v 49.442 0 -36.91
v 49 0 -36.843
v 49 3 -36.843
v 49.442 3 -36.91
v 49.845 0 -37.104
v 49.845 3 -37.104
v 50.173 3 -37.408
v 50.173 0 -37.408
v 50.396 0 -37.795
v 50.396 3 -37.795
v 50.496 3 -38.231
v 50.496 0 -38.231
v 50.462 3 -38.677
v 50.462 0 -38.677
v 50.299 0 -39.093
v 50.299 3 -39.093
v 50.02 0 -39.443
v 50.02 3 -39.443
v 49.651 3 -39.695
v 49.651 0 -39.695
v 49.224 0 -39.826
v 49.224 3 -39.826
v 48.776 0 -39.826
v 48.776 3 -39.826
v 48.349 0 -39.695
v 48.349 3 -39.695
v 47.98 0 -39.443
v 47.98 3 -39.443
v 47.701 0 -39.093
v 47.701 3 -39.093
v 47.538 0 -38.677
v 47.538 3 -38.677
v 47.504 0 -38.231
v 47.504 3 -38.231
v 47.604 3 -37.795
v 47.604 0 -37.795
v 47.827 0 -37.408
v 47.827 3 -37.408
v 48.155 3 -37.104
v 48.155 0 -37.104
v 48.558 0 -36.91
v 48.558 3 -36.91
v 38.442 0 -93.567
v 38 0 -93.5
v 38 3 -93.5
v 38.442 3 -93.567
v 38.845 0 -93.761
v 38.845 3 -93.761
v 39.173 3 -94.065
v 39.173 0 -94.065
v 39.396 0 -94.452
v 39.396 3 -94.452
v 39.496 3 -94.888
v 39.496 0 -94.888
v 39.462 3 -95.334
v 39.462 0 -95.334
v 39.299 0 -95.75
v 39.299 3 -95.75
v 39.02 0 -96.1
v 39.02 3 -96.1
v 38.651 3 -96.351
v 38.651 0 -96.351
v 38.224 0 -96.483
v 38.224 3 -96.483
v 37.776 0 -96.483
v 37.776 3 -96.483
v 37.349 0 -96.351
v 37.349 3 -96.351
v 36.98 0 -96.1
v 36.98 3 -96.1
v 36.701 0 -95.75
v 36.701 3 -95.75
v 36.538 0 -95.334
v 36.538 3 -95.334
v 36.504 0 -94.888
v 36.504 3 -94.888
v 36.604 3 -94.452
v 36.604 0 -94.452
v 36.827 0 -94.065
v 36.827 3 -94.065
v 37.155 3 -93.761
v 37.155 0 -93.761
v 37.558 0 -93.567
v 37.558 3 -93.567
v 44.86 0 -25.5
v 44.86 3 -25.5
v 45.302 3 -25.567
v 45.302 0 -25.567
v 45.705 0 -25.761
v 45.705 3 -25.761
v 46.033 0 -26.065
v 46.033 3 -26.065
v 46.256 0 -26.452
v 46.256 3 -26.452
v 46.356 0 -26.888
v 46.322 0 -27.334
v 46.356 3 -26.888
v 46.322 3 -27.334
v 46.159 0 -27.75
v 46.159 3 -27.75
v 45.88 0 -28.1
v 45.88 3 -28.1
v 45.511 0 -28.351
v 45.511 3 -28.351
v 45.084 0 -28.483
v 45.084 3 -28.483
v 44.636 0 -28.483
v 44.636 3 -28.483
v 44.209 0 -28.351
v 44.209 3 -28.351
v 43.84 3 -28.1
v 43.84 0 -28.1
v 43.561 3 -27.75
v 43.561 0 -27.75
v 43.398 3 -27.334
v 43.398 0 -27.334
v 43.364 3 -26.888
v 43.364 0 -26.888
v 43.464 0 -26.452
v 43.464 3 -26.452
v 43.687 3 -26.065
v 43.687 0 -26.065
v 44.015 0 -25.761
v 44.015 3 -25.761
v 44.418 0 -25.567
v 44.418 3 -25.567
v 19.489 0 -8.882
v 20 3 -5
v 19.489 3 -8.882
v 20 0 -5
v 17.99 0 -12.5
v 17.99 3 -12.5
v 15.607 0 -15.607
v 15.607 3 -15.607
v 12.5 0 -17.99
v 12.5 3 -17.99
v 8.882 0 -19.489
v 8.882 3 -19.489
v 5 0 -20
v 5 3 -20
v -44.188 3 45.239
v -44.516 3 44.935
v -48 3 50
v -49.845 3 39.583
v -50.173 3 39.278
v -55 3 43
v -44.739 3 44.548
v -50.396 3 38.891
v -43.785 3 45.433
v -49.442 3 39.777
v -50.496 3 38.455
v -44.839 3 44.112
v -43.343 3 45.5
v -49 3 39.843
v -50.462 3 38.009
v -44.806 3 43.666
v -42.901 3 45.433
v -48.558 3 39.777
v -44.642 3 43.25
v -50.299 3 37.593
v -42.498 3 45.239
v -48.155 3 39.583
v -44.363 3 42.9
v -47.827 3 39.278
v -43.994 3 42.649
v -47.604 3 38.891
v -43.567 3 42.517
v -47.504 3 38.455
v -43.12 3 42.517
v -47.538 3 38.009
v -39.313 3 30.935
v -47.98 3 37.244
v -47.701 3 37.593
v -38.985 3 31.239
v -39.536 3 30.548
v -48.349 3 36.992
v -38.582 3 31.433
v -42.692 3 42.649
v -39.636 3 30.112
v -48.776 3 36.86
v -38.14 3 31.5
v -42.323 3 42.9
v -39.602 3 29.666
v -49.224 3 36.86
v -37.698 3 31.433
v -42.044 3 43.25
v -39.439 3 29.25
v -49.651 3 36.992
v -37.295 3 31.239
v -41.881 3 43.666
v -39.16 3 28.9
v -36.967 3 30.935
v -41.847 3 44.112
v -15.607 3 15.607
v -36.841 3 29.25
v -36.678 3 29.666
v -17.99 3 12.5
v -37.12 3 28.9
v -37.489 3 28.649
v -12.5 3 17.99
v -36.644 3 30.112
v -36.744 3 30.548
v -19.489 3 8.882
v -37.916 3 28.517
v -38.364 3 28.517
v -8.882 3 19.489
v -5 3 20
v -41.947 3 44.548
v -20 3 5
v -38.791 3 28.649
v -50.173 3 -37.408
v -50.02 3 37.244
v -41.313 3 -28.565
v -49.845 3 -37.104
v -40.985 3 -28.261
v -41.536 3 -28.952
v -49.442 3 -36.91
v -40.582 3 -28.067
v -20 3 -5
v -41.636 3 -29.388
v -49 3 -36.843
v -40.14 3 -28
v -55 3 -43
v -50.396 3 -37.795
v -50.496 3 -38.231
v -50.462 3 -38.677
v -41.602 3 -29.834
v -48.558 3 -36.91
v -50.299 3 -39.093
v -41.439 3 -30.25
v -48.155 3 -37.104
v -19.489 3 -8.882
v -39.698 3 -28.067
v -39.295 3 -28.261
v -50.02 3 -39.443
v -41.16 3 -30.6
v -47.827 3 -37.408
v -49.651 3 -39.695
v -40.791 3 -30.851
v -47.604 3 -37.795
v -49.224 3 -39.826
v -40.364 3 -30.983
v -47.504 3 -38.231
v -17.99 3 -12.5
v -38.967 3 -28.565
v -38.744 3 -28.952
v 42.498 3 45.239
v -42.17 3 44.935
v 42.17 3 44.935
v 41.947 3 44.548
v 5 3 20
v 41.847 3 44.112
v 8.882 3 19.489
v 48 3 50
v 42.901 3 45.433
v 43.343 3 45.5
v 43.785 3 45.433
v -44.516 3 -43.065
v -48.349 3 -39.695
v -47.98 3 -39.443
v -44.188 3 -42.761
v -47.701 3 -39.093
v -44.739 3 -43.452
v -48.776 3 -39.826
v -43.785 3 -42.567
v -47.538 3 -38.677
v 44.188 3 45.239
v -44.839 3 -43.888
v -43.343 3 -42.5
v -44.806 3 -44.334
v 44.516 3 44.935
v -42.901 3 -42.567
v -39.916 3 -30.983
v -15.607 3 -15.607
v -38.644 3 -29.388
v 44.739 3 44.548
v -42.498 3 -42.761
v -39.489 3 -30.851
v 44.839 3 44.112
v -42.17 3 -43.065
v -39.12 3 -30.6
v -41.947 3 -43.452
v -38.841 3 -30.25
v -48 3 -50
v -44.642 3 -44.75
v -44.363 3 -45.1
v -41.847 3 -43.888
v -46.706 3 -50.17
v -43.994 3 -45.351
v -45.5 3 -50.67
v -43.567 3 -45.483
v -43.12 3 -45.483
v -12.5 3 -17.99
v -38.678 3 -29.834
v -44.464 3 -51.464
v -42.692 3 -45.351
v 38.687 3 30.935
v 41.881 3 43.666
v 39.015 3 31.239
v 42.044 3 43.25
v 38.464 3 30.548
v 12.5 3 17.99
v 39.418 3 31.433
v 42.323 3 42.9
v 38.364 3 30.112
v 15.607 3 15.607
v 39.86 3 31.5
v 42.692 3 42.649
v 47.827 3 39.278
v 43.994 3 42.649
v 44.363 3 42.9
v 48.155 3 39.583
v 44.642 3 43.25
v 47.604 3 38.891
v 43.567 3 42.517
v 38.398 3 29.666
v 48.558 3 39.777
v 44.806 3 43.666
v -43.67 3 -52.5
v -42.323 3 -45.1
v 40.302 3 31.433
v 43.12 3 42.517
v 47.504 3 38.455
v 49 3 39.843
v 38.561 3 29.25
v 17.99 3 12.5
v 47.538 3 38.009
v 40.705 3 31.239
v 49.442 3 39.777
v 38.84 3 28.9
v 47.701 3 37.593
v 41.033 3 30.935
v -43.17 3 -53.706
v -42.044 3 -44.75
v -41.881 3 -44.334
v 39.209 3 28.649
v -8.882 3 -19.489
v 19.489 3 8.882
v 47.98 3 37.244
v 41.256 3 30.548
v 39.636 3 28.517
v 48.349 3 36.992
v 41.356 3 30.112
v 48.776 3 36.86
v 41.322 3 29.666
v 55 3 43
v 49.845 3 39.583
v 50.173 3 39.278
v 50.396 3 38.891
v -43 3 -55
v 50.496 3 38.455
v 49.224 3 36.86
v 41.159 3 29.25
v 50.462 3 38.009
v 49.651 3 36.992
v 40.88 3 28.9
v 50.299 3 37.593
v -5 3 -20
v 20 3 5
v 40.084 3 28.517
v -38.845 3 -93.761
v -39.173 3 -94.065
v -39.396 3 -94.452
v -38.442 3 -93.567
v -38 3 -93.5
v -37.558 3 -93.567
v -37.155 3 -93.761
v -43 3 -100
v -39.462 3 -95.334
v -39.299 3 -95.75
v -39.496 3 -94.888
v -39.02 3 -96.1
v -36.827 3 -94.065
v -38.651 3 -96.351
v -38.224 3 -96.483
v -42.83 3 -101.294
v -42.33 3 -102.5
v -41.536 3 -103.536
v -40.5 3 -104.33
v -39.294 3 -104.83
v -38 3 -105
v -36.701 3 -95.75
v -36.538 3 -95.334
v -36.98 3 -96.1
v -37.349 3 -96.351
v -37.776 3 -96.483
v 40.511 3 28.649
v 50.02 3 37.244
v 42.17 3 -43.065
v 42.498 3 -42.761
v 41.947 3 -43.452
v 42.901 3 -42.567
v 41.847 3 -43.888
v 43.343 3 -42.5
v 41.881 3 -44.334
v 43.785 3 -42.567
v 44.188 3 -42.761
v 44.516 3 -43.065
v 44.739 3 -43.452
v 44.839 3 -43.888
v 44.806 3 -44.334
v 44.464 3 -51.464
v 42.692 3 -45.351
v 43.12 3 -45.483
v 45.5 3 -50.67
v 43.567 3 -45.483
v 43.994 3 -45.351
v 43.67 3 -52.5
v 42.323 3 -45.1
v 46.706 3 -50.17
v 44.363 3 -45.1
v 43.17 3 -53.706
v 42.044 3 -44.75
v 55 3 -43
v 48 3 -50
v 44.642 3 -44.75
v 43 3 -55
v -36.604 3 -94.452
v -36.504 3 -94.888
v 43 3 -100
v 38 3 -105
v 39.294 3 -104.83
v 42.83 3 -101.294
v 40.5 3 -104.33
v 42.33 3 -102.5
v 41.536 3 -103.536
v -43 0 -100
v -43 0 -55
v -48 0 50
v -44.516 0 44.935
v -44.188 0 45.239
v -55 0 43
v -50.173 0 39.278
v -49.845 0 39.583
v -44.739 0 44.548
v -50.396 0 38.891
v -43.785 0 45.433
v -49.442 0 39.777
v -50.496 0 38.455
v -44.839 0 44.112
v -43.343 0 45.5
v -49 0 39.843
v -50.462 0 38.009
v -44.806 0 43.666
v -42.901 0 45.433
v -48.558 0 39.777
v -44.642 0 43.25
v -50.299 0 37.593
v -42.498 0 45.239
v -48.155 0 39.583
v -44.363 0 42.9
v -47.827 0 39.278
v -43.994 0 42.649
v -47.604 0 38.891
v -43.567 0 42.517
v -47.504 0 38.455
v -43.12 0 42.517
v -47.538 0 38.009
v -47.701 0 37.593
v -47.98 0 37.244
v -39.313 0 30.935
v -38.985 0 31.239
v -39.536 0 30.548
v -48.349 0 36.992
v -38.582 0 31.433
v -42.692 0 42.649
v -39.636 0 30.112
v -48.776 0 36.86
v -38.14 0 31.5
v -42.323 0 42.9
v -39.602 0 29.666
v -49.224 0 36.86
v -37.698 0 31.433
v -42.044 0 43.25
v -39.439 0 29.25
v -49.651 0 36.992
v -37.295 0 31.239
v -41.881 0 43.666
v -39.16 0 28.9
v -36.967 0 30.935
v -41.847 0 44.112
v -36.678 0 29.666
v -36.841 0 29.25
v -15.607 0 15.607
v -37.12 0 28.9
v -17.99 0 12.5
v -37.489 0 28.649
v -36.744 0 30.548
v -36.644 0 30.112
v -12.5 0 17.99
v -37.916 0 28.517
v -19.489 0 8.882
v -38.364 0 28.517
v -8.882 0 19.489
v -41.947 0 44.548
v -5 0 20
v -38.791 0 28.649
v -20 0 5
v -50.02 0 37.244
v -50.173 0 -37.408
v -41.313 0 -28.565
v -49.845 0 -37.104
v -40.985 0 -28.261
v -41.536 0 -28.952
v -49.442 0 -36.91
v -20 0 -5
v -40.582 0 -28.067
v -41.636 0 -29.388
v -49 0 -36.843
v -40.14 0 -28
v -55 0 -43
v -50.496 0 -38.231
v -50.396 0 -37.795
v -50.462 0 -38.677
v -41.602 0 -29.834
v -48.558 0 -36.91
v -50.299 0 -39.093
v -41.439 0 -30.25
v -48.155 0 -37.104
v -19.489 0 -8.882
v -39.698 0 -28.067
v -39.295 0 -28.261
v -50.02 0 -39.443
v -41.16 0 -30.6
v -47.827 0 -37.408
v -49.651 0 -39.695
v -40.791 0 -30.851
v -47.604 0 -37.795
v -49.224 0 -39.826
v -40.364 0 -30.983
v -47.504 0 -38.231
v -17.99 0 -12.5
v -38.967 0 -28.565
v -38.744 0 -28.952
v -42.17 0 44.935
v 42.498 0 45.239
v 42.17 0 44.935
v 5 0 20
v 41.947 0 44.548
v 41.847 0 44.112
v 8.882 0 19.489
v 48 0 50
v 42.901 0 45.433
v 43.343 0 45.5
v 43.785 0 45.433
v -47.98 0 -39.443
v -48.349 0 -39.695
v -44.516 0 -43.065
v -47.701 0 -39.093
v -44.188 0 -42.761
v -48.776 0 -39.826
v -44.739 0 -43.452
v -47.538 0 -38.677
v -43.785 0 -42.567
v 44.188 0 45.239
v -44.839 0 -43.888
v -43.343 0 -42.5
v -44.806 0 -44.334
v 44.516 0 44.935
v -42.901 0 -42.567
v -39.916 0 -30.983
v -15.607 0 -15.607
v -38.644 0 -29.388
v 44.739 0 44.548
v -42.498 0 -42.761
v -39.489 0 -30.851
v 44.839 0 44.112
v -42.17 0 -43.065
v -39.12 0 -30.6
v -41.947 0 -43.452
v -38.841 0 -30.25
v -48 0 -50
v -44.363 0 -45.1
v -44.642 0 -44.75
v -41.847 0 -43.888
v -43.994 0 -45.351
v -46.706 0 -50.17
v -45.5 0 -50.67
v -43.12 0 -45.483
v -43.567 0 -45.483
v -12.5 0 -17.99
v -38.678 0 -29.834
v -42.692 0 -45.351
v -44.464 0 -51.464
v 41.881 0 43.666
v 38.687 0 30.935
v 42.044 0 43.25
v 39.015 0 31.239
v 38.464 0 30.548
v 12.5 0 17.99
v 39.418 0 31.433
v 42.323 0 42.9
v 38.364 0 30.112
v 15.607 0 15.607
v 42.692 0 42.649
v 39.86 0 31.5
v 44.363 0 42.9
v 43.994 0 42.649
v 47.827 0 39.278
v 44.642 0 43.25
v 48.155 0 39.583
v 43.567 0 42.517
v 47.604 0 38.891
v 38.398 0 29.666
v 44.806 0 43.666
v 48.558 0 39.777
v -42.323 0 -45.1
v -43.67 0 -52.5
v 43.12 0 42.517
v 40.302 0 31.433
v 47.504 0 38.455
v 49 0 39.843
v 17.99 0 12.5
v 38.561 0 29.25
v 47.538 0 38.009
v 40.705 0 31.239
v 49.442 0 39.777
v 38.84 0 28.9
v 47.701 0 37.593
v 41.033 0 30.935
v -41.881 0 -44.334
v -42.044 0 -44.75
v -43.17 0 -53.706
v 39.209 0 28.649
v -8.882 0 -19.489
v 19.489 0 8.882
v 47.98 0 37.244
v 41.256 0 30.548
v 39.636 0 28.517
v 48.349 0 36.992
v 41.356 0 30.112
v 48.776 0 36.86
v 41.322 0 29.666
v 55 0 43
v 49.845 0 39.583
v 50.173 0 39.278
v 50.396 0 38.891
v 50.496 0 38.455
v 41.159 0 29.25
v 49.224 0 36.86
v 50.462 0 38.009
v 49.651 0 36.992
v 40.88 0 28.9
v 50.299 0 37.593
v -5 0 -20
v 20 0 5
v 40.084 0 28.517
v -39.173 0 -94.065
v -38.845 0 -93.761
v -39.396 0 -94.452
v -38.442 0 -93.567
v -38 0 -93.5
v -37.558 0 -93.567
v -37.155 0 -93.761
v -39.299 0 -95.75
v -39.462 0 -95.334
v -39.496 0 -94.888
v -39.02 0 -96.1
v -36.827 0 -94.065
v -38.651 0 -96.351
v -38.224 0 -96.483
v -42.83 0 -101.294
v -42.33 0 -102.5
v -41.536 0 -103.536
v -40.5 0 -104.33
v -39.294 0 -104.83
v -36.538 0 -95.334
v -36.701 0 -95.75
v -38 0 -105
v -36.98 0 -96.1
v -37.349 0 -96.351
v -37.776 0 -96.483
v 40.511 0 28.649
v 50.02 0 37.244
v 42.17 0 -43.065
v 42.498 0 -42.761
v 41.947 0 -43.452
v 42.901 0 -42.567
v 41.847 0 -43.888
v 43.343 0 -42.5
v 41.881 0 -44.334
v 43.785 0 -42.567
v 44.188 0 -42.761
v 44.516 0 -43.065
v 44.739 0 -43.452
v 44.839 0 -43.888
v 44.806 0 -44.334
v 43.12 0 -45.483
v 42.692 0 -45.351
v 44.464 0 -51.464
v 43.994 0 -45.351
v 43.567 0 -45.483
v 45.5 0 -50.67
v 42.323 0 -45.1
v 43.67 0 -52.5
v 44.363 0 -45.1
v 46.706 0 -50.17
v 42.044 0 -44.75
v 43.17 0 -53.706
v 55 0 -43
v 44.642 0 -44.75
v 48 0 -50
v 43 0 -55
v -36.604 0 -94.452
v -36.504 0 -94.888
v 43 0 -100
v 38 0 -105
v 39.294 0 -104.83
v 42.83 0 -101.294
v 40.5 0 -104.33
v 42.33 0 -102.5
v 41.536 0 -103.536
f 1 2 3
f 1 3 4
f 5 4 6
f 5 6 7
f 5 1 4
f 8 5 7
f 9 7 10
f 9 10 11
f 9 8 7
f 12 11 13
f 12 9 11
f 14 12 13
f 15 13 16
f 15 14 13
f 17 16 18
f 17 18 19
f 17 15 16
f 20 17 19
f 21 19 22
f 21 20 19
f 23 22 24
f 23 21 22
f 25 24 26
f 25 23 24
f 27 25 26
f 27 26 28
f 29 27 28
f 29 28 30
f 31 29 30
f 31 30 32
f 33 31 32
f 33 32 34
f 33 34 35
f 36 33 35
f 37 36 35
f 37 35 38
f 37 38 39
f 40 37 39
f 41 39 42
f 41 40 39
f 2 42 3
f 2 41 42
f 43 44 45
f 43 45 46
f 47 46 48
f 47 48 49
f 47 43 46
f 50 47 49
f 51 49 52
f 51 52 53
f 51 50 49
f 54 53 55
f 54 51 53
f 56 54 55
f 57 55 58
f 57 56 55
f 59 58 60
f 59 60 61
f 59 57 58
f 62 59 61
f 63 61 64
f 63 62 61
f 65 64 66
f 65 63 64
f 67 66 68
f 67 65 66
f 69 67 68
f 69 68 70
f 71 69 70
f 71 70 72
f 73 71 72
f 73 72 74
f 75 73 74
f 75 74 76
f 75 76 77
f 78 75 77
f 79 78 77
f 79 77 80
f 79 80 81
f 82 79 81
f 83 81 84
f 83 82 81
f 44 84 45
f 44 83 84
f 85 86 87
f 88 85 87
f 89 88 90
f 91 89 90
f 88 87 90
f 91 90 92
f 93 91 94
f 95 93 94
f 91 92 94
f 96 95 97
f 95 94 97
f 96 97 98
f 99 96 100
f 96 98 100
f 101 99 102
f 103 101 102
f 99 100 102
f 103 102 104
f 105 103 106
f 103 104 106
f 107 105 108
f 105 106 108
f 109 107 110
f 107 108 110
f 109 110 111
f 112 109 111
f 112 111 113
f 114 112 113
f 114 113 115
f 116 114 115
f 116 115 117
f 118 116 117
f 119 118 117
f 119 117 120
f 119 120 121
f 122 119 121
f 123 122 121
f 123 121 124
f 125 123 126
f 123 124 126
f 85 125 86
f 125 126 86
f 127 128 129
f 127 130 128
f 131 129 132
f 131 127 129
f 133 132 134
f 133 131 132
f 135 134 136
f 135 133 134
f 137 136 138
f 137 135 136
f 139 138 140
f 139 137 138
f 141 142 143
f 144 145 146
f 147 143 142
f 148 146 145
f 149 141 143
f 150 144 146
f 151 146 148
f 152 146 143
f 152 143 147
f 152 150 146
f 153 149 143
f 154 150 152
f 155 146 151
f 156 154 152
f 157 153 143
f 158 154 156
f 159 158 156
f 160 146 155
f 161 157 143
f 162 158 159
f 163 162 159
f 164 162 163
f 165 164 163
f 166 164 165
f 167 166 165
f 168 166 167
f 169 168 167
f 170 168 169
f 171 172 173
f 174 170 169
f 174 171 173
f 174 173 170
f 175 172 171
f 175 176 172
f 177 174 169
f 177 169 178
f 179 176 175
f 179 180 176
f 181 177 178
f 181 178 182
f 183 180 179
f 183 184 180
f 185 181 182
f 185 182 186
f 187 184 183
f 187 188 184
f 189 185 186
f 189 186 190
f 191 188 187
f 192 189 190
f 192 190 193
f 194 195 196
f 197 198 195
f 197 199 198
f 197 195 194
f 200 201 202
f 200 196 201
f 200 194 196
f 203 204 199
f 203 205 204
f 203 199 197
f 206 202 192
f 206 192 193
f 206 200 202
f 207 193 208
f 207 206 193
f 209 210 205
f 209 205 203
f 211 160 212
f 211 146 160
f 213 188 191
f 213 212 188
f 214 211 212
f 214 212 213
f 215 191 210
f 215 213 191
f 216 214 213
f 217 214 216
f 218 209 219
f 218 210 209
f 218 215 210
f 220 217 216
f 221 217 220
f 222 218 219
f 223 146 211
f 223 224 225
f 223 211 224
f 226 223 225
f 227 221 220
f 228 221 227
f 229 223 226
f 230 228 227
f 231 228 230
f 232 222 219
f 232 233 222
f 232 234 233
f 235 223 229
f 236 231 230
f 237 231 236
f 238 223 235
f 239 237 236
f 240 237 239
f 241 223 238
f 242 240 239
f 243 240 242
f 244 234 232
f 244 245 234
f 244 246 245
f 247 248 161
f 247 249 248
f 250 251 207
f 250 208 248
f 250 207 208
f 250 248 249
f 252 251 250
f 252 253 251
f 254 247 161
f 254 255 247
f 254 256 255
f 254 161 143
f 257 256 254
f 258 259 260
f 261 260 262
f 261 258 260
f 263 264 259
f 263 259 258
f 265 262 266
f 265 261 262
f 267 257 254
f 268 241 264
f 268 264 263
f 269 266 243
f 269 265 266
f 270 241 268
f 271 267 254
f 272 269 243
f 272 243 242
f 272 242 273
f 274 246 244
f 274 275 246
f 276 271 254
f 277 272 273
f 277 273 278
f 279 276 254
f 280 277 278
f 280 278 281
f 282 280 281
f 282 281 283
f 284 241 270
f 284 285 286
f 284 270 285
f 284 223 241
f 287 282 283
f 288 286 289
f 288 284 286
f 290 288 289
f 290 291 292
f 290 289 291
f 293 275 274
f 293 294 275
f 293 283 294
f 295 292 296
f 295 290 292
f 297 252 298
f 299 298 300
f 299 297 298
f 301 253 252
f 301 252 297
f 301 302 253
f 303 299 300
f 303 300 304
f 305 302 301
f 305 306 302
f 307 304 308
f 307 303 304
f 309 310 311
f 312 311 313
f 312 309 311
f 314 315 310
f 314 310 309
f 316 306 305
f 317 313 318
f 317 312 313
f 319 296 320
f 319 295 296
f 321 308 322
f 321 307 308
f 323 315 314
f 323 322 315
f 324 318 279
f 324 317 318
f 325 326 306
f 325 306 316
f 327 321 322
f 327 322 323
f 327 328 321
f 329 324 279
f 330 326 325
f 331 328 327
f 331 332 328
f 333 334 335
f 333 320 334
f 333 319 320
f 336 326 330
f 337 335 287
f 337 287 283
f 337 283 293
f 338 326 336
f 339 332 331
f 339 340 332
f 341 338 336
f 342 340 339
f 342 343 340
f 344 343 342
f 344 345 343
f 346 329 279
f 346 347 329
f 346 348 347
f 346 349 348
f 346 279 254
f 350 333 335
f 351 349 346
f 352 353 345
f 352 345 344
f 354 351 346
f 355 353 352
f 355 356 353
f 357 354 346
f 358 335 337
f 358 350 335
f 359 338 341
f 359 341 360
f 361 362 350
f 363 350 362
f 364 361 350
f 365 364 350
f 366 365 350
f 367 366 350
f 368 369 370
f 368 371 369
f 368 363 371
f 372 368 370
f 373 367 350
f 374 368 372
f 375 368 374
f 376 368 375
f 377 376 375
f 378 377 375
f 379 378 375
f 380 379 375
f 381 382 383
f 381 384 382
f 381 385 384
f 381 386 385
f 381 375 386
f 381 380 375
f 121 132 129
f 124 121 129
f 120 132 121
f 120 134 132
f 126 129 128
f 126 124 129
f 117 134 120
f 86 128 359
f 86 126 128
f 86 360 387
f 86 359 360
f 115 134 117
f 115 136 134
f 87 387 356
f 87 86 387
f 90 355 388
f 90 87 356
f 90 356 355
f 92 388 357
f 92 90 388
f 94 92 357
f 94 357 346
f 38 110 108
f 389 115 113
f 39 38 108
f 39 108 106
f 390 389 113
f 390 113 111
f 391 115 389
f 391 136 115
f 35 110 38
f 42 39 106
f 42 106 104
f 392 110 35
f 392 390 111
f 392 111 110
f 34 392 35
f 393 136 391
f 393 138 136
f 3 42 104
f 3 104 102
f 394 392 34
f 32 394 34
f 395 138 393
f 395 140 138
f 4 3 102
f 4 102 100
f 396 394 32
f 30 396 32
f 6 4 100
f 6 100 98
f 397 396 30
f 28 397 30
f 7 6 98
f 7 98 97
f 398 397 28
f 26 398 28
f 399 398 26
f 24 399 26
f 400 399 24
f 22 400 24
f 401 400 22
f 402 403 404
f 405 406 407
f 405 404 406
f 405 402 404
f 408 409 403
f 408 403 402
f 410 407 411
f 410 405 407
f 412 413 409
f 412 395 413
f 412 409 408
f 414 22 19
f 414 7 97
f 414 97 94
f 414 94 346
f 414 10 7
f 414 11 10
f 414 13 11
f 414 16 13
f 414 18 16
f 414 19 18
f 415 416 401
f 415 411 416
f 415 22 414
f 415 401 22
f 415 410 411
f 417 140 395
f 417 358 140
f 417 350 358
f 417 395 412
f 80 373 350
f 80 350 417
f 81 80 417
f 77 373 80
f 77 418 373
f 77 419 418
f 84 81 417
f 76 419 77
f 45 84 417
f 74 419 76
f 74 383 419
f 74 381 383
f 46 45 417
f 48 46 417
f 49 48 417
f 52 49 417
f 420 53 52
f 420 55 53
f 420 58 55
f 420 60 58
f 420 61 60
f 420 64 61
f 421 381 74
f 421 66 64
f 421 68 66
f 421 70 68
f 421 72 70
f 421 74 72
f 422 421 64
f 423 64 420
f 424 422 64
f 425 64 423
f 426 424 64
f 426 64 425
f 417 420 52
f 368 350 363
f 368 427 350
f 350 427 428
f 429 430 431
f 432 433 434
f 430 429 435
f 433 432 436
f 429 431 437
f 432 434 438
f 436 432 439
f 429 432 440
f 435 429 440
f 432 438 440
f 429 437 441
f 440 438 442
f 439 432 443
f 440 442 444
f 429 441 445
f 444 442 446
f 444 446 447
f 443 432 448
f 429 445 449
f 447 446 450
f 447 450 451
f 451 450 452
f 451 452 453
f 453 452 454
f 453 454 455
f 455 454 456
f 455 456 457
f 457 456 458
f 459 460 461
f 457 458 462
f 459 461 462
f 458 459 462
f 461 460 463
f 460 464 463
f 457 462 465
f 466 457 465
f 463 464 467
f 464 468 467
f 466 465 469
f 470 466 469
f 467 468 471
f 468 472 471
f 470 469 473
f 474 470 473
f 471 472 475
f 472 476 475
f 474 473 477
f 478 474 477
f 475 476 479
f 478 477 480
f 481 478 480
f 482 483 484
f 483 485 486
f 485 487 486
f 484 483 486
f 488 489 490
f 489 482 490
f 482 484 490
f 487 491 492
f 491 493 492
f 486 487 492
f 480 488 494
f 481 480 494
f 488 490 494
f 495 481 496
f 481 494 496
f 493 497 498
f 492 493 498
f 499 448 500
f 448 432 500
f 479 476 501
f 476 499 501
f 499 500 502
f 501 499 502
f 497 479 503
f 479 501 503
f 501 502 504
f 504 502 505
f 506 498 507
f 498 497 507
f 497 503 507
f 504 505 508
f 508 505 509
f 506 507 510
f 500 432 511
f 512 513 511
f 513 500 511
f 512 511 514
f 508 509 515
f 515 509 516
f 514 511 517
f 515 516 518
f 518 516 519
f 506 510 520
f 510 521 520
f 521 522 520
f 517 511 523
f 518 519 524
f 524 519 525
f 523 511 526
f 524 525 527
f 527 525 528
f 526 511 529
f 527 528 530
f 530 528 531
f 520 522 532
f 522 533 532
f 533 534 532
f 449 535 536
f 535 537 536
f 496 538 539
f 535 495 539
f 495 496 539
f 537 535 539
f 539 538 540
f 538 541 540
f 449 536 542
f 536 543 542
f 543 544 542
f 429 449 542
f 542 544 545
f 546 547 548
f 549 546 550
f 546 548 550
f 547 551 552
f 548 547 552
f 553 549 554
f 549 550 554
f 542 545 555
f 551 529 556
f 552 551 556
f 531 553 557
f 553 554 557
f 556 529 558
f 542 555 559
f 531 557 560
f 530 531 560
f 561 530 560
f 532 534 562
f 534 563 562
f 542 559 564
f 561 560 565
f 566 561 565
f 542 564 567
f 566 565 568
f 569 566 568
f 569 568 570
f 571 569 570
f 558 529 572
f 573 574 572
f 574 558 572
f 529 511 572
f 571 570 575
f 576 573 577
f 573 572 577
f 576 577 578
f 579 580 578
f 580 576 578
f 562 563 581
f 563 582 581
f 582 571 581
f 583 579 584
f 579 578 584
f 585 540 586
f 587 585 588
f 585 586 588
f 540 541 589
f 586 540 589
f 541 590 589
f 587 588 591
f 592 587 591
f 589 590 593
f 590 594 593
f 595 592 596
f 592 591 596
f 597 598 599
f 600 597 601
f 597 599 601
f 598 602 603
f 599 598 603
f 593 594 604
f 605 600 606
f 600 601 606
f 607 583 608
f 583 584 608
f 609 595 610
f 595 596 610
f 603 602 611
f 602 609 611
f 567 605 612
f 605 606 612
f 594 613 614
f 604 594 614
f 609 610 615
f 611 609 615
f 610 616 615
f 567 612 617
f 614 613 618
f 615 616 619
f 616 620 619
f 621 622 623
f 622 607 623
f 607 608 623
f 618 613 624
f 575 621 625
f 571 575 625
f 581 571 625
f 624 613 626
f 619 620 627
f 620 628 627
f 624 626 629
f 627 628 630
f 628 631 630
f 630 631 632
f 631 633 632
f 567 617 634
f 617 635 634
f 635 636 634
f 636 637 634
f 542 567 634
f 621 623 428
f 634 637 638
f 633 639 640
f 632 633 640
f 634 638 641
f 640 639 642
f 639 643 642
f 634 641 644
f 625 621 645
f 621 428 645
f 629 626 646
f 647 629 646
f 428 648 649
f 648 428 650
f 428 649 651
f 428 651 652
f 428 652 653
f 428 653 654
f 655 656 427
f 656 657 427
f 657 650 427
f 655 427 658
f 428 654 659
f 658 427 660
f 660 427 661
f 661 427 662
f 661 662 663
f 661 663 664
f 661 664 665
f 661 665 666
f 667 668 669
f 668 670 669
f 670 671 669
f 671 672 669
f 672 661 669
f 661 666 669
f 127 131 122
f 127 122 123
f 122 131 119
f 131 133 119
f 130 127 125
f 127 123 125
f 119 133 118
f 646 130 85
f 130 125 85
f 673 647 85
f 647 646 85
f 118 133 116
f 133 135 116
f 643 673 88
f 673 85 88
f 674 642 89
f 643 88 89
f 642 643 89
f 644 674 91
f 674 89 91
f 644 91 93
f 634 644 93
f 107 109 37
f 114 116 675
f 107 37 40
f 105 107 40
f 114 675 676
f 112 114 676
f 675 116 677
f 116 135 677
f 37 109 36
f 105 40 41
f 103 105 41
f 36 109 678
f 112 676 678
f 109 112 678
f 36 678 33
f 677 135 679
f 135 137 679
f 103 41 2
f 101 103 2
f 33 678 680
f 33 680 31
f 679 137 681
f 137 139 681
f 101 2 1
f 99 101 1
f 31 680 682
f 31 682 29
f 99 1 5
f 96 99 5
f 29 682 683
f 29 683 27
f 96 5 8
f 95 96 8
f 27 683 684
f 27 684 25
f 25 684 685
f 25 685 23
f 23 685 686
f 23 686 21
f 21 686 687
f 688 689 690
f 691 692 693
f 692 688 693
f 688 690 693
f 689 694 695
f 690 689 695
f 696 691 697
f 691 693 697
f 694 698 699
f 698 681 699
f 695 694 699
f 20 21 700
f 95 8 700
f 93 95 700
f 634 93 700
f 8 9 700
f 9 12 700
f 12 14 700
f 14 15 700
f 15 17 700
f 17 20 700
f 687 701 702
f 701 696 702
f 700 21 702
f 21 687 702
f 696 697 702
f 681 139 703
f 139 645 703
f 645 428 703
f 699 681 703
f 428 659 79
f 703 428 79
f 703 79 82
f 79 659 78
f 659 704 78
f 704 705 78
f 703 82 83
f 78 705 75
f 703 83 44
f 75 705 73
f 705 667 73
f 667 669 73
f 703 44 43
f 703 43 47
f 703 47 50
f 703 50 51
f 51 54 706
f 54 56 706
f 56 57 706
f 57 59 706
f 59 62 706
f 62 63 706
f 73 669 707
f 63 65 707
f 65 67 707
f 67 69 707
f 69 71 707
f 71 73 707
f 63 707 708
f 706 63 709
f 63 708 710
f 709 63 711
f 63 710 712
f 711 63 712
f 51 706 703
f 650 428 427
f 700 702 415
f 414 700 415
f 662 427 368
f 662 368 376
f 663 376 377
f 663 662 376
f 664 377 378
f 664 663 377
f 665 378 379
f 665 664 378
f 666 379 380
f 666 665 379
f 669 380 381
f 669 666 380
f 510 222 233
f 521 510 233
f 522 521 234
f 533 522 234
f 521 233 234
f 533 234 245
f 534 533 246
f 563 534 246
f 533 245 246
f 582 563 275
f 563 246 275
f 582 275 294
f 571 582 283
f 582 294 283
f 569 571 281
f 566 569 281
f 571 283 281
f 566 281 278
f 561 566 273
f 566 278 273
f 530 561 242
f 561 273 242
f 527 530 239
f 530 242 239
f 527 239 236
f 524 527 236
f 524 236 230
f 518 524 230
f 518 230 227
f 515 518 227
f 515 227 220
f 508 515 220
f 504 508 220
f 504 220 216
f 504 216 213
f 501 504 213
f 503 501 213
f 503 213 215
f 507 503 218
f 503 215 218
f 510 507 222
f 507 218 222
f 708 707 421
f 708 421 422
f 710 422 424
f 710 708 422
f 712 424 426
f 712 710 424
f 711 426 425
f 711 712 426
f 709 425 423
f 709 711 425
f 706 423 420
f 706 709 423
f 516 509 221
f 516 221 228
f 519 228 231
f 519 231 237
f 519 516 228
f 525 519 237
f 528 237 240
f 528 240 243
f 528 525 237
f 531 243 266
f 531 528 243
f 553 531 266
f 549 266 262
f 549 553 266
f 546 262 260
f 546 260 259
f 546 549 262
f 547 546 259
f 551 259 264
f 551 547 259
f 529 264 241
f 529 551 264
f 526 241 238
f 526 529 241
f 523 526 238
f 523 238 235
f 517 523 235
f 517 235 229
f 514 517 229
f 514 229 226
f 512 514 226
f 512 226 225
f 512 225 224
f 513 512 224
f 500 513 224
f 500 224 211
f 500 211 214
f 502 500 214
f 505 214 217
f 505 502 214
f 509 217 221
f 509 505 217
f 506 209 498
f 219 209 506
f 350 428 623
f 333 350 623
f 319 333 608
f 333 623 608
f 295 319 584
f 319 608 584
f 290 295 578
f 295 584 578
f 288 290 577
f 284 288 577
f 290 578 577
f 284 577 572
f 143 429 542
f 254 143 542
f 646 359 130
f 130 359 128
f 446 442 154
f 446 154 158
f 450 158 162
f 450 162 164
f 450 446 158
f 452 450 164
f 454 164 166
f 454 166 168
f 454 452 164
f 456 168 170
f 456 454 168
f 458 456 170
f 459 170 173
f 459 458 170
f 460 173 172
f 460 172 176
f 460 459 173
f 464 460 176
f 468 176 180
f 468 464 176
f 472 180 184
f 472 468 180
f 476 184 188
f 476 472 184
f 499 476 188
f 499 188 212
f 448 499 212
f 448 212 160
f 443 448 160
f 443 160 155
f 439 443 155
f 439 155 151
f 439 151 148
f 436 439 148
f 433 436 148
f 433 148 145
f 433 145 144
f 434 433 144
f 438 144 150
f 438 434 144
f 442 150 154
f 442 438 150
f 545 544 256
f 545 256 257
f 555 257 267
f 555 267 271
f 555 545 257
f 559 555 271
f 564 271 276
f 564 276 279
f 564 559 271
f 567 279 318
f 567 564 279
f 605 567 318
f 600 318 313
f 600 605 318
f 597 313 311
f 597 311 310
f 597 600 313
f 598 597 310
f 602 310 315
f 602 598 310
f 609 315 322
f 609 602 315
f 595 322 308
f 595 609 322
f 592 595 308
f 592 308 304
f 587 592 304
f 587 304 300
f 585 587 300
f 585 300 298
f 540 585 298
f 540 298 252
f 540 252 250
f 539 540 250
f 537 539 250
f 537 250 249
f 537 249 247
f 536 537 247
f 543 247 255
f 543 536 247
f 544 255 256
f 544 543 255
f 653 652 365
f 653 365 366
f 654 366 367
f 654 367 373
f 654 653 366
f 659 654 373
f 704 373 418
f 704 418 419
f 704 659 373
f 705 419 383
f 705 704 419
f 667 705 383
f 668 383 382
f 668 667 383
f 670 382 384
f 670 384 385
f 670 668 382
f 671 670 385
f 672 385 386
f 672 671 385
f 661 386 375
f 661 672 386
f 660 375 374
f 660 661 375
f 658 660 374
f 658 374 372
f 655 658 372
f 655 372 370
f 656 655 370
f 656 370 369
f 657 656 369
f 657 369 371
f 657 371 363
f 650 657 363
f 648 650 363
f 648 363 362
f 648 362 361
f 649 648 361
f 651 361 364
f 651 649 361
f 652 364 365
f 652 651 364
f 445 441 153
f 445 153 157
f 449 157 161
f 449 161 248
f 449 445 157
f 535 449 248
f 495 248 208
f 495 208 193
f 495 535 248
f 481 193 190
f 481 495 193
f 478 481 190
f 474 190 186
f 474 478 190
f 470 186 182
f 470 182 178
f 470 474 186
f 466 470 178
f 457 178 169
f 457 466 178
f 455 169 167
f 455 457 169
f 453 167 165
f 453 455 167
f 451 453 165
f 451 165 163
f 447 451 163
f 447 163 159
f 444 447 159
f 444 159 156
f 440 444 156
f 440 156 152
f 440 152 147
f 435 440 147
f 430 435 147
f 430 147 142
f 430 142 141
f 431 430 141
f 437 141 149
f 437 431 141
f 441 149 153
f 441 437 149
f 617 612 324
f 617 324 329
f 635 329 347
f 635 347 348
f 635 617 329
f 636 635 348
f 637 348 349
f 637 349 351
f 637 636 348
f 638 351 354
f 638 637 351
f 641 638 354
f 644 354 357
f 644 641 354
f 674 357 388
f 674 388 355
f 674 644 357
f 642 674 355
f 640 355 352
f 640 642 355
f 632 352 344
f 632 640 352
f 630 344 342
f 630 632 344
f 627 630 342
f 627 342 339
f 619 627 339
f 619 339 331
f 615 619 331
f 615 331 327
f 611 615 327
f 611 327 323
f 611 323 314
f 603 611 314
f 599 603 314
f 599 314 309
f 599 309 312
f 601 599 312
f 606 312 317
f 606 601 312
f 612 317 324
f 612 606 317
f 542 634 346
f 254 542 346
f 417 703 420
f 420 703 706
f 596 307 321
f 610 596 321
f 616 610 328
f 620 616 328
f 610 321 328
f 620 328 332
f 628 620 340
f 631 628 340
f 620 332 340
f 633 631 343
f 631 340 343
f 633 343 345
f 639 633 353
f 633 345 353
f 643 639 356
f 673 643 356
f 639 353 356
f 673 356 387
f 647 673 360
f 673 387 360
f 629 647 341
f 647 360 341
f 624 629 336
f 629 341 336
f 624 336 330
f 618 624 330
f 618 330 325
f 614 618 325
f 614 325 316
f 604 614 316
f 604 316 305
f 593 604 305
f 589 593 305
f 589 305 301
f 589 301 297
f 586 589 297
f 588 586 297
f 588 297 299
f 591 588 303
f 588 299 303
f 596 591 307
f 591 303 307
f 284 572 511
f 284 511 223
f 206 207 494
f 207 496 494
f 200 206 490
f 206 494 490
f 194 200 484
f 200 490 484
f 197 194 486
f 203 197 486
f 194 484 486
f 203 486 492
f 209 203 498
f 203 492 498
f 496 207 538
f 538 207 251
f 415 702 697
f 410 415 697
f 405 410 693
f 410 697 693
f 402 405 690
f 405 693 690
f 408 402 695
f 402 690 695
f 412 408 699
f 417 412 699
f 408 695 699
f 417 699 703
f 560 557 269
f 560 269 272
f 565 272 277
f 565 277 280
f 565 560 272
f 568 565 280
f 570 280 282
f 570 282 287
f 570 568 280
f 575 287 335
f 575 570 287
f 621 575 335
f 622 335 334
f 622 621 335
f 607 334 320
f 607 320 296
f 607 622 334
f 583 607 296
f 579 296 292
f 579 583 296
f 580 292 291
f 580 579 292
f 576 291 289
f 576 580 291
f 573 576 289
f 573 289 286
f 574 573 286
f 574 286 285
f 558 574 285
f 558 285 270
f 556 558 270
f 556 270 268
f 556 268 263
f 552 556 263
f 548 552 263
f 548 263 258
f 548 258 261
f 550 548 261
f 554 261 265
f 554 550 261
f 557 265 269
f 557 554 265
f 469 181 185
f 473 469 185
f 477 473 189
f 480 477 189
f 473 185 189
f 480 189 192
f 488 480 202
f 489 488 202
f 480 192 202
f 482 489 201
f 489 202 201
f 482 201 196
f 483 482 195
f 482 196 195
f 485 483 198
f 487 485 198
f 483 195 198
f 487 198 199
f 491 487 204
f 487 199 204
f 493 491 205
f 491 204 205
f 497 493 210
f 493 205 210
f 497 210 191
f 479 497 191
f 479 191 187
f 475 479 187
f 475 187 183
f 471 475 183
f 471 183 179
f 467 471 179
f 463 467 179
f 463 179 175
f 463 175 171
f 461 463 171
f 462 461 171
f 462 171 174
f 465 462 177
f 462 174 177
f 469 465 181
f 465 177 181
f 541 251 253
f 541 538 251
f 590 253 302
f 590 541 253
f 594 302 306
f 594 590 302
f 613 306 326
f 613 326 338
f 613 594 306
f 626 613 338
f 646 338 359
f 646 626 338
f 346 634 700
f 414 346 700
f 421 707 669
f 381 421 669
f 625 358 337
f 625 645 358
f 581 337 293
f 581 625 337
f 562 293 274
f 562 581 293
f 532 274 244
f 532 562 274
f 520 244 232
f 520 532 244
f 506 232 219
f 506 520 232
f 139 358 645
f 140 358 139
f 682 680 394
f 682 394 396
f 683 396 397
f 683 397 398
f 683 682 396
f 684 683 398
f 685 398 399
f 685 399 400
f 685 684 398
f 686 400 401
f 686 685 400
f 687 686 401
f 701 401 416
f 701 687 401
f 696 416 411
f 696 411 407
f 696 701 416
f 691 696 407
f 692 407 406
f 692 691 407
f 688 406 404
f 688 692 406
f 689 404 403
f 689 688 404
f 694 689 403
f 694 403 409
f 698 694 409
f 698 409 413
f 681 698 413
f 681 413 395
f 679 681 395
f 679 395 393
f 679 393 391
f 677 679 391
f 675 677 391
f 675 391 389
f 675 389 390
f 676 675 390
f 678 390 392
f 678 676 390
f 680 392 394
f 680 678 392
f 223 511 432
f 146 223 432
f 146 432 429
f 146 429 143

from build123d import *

# Parameters (mm, degrees)
SKETCH_1_R          = 1.5
EXTRUDE_1_DEPTH     = 3
CHAMFER_1_SIZE      = 7
FILLET_START        = -1
FILLET_1_DEPTH      = 5
FILLET_1_2_DEPTH    = 3
SKETCH_3_R          = 1.5
SKETCH_3_W          = 40
SKETCH_3_H          = 40
CUT_EXTRUDE_1_DEPTH = 3
FILLET_2_R          = 15


with BuildPart() as part:
    # 草图1 → 凸台-拉伸1 (new body)
    with BuildSketch(Plane(origin=(0, 0, 0), x_dir=(1, 0, 0), z_dir=(0, 1, 0))):
        Polygon((-55, 50), (-55, -50), (55, -50), (55, 50), (43, 50), (43, 105), (-43, 105), (-43, 50), align=None)
        with Locations(Location((-43.343145751, -44, 0), (0, 0, 270))):
            Circle(SKETCH_1_R, mode=Mode.SUBTRACT)
        with Locations(Location((-49, -38.343145751, 0), (0, 0, 270))):
            Circle(SKETCH_1_R, mode=Mode.SUBTRACT)
        with Locations(Location((43.343145751, -44, 0), (0, 0, 270))):
            Circle(SKETCH_1_R, mode=Mode.SUBTRACT)
        with Locations(Location((49, -38.343145751, 0), (0, 0, 270))):
            Circle(SKETCH_1_R, mode=Mode.SUBTRACT)
        with Locations(Location((-49, 38.343145751, 0), (0, 0, 270))):
            Circle(SKETCH_1_R, mode=Mode.SUBTRACT)
        with Locations(Location((-43.343145751, 44, 0), (0, 0, 270))):
            Circle(SKETCH_1_R, mode=Mode.SUBTRACT)
        with Locations(Location((43.343145751, 44, 0), (0, 0, 270))):
            Circle(SKETCH_1_R, mode=Mode.SUBTRACT)
        with Locations(Location((49, 38.343145751, 0), (0, 0, 270))):
            Circle(SKETCH_1_R, mode=Mode.SUBTRACT)
        with Locations(Location((38, 95, 0), (0, 0, 270))):
            Circle(SKETCH_1_R, mode=Mode.SUBTRACT)
        with Locations(Location((-38, 95, 0), (0, 0, 270))):
            Circle(SKETCH_1_R, mode=Mode.SUBTRACT)
    extrude(amount=EXTRUDE_1_DEPTH)

    # 倒角1
    chamfer_1_edges = [part.edges().sort_by_distance(p)[0] for p in [
        (-55, 1.5, 50),
        (-55, 1.5, -50),
        (55, 1.5, -50),
        (55, 1.5, 50),
    ]]
    chamfer(chamfer_1_edges, length=CHAMFER_1_SIZE)

    # 圆角1: read off the stored shape, not the designer's step
    # 圆角1 outline → 圆角1 (cut)
    with BuildSketch(Plane(origin=(0, 0, 0), x_dir=(1, 0, 0), z_dir=(0, 1, 0)).offset(FILLET_START)):
        with BuildLine():
            ThreePointArc((-43, 100), (-41.535533906, 103.535533906), (-38, 105))
            Line((-38, 105), (-43, 105))
            Line((-43, 105), (-43, 100))
        make_face()
        with BuildLine():
            ThreePointArc((38, 105), (41.535533906, 103.535533906), (43, 100))
            Line((43, 100), (43, 105))
            Line((43, 105), (38, 105))
        make_face()
    extrude(amount=FILLET_1_DEPTH, mode=Mode.SUBTRACT)

    # Fillet 1 2 outline → Fillet 1 2 (add)
    with BuildSketch(Plane(origin=(0, 0, 0), x_dir=(1, 0, 0), z_dir=(0, 1, 0))):
        with BuildLine():
            Line((43, 50), (48, 50))
            ThreePointArc((48, 50), (44.464466094, 51.464466094), (43, 55))
            Line((43, 55), (43, 50))
        make_face()
        with BuildLine():
            Line((-43, 50), (-43, 55))
            ThreePointArc((-43, 55), (-44.464466094, 51.464466094), (-48, 50))
            Line((-48, 50), (-43, 50))
        make_face()
    extrude(amount=FILLET_1_2_DEPTH)

    # 草图3 → 切除-拉伸1 (cut)
    with BuildSketch(Plane(origin=(0, 3, 0), x_dir=(1, 0, 0), z_dir=(0, 1, 0))):
        with Locations(Location((-40.14, 29.5, 0), (0, 0, 270))):
            Circle(SKETCH_3_R)
        with Locations(Location((44.86, 27, 0), (0, 0, 270))):
            Circle(SKETCH_3_R)
        with Locations(Location((-38.14, -30, 0), (0, 0, 270))):
            Circle(SKETCH_3_R)
        with Locations(Location((39.86, -30, 0), (0, 0, 270))):
            Circle(SKETCH_3_R)
        Rectangle(SKETCH_3_W, SKETCH_3_H)
    extrude(amount=-CUT_EXTRUDE_1_DEPTH, mode=Mode.SUBTRACT)

    # 圆角2
    fillet_2_edges = [part.edges().sort_by_distance(p)[0] for p in [
        (20, 1.5, -20),
        (20, 1.5, 20),
        (-20, 1.5, 20),
        (-20, 1.5, -20),
    ]]
    fillet(fillet_2_edges, radius=FILLET_2_R)


solid = part.part
